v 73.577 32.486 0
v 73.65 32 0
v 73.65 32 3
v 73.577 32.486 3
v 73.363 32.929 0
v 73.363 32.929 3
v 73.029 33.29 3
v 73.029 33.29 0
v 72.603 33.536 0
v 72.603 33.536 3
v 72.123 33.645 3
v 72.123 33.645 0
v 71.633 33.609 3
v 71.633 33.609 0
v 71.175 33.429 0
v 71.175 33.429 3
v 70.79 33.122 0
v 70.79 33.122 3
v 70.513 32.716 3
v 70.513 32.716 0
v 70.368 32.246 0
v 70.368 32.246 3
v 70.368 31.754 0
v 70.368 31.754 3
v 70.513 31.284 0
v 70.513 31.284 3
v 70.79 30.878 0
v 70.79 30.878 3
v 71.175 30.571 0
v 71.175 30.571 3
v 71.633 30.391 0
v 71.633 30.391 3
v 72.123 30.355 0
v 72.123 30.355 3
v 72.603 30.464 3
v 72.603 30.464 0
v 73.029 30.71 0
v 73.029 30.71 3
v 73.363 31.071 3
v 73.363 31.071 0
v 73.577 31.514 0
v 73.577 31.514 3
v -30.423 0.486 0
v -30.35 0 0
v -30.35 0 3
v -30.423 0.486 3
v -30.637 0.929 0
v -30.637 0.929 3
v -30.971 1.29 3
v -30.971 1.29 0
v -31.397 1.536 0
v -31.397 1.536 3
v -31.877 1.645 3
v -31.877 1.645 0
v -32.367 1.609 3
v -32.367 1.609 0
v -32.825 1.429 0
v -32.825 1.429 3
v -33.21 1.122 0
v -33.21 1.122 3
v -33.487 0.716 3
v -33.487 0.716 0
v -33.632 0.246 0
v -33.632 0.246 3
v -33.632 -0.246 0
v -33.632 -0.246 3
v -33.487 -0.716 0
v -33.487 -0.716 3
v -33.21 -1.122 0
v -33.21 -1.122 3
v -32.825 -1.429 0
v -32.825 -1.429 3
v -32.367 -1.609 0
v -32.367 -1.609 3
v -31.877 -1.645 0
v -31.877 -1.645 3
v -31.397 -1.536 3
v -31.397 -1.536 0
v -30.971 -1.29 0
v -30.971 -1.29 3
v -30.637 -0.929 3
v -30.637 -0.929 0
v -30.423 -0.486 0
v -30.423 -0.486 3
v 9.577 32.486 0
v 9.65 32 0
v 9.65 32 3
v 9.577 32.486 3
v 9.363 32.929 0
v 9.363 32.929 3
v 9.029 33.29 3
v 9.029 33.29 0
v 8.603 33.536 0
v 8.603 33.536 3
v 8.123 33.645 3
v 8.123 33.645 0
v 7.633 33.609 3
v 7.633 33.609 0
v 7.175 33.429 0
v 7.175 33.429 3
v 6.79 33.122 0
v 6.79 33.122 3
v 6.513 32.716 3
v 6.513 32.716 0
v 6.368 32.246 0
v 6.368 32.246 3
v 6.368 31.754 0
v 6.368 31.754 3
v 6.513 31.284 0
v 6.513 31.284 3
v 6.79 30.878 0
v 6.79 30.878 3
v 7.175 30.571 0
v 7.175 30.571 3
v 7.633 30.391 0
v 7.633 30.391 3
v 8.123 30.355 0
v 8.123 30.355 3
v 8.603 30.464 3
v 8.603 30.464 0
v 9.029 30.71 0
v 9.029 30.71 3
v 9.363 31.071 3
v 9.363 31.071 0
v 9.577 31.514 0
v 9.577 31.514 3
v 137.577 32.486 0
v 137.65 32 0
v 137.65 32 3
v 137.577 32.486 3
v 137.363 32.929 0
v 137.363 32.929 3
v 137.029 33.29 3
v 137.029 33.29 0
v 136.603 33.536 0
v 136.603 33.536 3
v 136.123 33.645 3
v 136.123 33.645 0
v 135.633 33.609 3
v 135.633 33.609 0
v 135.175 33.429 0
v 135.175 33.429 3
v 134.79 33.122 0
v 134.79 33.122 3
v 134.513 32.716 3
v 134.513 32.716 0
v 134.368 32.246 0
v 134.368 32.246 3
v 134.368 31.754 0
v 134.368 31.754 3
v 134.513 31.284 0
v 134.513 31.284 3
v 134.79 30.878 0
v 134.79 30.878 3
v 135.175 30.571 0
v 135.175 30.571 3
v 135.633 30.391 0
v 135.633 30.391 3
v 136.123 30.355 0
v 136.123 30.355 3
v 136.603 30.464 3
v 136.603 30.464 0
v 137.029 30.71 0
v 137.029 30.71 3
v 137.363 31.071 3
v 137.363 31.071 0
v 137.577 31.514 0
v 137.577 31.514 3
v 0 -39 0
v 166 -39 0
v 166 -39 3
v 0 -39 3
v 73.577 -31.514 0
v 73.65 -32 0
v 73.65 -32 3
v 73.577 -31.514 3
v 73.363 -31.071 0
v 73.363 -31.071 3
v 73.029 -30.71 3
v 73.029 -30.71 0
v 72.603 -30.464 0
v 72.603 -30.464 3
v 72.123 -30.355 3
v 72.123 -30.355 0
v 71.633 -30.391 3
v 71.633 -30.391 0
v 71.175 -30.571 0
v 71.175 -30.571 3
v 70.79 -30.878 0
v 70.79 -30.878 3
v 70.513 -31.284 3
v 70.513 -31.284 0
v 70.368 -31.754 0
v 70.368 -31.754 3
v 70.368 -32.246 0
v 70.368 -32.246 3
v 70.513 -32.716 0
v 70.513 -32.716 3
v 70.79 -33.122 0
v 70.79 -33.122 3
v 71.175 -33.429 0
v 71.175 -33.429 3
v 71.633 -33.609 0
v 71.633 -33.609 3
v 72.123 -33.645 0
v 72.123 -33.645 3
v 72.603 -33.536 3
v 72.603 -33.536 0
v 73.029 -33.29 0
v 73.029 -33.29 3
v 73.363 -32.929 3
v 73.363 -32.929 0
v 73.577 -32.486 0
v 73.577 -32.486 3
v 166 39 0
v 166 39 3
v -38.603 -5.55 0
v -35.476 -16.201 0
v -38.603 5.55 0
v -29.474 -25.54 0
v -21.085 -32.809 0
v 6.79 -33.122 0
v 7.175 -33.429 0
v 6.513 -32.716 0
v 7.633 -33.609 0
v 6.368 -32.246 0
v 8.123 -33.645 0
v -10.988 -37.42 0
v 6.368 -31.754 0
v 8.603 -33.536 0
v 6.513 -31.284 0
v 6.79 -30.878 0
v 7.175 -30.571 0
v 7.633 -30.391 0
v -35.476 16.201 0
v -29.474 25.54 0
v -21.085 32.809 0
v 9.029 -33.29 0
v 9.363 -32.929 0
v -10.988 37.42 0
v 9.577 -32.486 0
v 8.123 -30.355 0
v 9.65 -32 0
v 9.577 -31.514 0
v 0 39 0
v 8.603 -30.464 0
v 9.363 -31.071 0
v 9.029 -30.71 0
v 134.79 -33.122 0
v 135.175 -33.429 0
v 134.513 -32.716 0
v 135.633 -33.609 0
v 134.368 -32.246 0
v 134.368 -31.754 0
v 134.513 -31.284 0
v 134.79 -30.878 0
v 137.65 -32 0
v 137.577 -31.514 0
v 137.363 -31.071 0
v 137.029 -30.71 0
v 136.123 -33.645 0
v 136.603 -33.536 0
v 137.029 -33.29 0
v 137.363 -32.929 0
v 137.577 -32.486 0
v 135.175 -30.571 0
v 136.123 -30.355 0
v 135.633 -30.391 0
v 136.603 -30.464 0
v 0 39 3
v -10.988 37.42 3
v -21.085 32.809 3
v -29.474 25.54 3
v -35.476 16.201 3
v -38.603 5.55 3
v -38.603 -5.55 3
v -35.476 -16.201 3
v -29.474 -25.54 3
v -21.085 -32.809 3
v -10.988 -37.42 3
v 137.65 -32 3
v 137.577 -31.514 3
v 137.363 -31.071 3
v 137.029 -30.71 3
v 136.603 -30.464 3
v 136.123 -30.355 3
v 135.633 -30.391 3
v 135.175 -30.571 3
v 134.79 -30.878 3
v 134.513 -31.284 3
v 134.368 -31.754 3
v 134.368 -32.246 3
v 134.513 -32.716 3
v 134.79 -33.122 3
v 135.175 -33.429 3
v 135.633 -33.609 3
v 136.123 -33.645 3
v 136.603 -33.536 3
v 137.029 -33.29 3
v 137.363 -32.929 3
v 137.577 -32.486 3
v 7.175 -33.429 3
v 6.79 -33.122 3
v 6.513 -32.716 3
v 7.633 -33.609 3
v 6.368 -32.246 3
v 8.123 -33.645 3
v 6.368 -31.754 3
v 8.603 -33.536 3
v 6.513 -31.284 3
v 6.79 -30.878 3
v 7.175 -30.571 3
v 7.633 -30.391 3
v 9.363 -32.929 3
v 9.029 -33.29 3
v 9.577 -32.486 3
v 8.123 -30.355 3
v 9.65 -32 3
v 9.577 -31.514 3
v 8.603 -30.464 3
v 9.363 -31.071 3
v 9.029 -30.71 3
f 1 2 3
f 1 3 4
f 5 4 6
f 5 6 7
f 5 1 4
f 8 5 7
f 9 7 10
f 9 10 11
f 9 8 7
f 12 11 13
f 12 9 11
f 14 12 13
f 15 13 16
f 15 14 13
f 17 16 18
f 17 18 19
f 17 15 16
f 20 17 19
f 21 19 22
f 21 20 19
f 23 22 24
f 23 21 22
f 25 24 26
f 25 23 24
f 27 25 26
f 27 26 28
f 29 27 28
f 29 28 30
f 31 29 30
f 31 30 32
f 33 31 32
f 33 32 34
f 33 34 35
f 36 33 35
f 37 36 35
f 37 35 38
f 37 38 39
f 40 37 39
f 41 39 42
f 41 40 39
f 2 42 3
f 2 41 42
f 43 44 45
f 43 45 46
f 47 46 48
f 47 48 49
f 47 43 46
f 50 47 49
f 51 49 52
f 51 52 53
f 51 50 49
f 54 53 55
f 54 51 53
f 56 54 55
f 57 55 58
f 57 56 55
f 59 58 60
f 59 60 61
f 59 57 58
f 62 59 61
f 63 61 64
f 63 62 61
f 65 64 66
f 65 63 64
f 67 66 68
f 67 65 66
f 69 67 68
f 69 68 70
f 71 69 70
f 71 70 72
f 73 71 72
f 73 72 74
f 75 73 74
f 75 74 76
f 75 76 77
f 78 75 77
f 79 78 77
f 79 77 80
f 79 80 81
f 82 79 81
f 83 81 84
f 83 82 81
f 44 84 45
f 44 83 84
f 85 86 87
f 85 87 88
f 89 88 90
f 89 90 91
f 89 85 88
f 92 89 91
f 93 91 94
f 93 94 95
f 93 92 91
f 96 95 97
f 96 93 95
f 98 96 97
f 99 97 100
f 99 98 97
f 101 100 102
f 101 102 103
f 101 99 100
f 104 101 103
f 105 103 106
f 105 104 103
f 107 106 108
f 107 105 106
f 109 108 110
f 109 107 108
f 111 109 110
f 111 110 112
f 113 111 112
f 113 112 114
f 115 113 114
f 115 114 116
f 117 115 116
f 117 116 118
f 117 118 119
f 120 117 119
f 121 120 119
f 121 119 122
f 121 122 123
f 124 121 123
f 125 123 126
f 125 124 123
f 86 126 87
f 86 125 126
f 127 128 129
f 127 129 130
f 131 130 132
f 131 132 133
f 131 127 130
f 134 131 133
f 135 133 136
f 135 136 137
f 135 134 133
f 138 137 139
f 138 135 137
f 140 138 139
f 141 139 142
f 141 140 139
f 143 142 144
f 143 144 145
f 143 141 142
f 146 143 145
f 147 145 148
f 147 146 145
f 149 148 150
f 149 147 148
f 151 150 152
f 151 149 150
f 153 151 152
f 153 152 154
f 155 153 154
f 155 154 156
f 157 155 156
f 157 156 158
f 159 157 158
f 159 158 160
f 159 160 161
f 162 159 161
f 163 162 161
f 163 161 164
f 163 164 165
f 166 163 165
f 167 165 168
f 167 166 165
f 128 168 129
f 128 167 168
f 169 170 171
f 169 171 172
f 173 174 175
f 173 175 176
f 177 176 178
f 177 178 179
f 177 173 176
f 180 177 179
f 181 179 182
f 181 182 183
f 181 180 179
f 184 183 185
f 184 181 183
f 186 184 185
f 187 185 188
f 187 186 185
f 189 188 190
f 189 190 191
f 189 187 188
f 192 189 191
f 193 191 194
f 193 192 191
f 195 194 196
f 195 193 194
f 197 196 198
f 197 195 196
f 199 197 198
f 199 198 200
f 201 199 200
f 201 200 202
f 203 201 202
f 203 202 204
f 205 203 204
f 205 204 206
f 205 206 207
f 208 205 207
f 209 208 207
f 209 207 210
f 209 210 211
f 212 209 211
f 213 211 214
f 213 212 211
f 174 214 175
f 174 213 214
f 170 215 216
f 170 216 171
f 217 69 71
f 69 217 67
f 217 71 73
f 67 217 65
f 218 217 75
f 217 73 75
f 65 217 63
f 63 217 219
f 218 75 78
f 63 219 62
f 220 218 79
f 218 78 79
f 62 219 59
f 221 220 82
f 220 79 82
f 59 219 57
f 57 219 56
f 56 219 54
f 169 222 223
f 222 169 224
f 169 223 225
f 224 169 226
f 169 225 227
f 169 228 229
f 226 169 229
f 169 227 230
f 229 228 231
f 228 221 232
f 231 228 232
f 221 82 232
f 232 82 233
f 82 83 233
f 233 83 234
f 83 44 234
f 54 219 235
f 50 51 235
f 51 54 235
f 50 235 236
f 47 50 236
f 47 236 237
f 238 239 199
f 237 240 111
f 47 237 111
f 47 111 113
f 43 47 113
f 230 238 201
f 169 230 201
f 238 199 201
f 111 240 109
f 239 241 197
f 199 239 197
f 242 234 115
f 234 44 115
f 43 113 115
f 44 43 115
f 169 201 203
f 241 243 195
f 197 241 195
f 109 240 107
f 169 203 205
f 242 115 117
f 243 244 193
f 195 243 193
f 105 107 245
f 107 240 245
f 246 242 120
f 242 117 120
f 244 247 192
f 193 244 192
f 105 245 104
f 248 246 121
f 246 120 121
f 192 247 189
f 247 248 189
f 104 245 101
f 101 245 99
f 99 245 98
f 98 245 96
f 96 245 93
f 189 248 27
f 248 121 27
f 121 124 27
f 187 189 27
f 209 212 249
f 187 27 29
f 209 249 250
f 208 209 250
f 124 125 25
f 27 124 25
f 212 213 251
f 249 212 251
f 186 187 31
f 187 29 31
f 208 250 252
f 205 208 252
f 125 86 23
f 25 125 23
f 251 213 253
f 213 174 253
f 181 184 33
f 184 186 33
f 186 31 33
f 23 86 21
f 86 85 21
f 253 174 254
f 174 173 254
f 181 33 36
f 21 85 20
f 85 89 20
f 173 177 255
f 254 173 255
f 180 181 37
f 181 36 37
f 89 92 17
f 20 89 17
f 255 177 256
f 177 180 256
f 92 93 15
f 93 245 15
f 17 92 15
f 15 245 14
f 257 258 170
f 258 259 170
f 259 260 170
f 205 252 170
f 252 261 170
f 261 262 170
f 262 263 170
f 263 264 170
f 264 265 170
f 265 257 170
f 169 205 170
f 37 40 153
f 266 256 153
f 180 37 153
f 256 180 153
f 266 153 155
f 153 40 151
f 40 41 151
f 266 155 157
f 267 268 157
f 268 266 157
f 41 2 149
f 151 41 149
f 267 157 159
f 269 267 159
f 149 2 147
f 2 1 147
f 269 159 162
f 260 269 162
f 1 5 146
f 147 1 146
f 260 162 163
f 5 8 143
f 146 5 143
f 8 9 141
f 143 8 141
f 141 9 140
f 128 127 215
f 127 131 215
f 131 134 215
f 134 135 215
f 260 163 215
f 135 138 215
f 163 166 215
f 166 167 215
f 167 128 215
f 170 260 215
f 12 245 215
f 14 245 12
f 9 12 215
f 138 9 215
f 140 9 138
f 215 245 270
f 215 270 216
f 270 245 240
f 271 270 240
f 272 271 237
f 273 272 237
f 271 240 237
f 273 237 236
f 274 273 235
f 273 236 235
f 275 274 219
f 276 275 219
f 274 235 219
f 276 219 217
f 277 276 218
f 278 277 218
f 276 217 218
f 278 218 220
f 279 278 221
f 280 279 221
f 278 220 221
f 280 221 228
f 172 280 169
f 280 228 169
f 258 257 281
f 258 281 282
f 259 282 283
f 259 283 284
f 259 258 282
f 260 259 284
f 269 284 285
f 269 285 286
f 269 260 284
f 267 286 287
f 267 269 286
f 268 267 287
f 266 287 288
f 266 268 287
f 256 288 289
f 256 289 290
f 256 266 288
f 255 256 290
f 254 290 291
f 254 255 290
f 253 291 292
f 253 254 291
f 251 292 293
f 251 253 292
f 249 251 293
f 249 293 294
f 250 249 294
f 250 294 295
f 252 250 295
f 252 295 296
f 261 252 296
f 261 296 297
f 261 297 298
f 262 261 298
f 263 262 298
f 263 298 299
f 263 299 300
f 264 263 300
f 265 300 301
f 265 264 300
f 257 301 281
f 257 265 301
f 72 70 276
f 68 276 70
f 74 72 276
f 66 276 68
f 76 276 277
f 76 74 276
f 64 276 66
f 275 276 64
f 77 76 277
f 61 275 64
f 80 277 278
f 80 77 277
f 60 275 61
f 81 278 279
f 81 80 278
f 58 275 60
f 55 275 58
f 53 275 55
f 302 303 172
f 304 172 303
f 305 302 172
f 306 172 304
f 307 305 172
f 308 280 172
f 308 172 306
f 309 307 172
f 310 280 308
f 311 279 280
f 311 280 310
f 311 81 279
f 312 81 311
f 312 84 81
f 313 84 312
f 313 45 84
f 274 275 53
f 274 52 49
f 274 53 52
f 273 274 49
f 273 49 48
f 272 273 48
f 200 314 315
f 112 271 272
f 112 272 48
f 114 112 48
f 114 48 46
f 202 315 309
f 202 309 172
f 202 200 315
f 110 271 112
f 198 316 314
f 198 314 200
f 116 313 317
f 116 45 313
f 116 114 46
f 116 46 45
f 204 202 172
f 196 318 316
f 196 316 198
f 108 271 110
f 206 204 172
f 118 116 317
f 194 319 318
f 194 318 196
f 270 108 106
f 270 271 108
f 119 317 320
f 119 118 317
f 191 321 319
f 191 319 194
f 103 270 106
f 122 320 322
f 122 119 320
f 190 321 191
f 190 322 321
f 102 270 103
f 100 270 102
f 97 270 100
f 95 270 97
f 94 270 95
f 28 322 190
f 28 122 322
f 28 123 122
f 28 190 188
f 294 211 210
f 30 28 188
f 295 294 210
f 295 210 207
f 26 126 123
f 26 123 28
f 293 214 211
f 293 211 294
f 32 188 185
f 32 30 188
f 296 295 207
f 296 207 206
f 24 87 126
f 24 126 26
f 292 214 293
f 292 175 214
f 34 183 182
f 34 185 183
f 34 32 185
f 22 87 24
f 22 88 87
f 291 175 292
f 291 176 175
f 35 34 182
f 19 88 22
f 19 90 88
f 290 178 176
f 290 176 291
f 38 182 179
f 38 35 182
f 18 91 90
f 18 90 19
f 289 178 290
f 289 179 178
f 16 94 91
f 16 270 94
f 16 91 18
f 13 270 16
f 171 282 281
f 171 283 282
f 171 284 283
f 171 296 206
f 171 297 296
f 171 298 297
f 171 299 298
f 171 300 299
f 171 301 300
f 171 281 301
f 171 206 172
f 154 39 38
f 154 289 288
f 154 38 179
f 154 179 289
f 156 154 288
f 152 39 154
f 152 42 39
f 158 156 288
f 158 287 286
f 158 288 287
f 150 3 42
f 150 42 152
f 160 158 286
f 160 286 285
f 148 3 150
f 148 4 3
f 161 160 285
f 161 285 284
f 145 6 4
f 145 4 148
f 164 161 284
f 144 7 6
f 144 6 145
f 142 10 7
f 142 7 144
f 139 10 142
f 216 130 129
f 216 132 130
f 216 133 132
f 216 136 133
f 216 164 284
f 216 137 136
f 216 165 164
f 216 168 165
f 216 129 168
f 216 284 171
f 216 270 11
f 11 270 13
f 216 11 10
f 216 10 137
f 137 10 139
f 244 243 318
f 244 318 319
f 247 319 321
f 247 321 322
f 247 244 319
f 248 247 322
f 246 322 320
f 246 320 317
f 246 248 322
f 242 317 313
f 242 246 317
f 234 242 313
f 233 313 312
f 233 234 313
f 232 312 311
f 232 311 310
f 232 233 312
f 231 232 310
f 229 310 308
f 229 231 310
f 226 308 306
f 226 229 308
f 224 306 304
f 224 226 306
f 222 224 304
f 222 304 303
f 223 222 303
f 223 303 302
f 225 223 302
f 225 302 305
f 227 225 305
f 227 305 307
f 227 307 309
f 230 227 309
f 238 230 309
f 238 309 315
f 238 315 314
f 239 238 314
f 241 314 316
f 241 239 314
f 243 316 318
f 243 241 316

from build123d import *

# Parameters (mm, degrees)
SKETCH_R  = 1.65
PAD_DEPTH = 3


with BuildPart() as part:
    # Sketch → Pad (new body)
    with BuildSketch(Plane.XY):
        with BuildLine():
            ThreePointArc((0, 39), (-39, 0), (0, -39))
            Line((166, -39), (0, -39))
            Line((166, 39), (166, -39))
            Line((0, 39), (166, 39))
        make_face()
        with Locations((-32, 0)):
            Circle(SKETCH_R, mode=Mode.SUBTRACT)
        with Locations((8, 32)):
            Circle(SKETCH_R, mode=Mode.SUBTRACT)
        with Locations((72, 32)):
            Circle(SKETCH_R, mode=Mode.SUBTRACT)
        with Locations((136, 32)):
            Circle(SKETCH_R, mode=Mode.SUBTRACT)
        with Locations((8, -32)):
            Circle(SKETCH_R, mode=Mode.SUBTRACT)
        with Locations((72, -32)):
            Circle(SKETCH_R, mode=Mode.SUBTRACT)
        with Locations((136, -32)):
            Circle(SKETCH_R, mode=Mode.SUBTRACT)
    extrude(amount=PAD_DEPTH)


solid = part.part
